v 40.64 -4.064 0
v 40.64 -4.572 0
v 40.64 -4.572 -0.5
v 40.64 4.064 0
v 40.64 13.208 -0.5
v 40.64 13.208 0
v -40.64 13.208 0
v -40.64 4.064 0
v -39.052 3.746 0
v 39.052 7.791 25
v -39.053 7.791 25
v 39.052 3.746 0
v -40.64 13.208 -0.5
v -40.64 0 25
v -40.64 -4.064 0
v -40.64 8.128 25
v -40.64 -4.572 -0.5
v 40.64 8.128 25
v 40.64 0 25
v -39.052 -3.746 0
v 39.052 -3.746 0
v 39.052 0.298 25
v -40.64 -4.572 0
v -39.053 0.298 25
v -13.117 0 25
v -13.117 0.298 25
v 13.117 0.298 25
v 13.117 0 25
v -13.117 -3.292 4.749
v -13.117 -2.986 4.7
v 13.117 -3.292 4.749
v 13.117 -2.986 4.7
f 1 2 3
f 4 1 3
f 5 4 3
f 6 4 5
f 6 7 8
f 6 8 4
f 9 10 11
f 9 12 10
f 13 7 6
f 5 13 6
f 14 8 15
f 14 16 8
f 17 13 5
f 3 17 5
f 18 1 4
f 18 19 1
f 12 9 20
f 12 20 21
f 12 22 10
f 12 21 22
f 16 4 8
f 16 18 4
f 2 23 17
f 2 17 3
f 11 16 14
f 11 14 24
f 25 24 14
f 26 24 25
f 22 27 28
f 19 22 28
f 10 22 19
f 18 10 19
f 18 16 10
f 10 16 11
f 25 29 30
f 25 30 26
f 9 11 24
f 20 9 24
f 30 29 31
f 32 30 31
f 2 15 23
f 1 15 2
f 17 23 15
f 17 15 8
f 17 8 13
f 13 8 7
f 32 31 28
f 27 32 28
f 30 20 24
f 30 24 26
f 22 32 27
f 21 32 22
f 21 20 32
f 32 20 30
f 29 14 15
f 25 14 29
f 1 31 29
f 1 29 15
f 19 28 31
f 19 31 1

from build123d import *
from build123d import SkipClean  # not in build123d's __all__

# Parameters (mm, degrees)
F1_W      = 81.28
F1_H      = 8.128
F2_W      = 81.28
F2_H      = 8.128
F4_W      = 26.233073324
F4_H      = 20.56436991
F5_DEPTH  = 1
F6_W      = 78.105
F6_H      = 7.493
F7_W      = 78.105
F7_H      = 7.493
F9_W      = 81.28
F9_H      = 17.78
F10_DEPTH = 0.5


with BuildPart() as f3:
    # F1 (on Top) → F3 section 0
    with BuildSketch(Plane.XY):
        Rectangle(F1_W, F1_H)
    # F2 (on offset) → F3 section 1
    with BuildSketch(Plane.XY.offset(25)):
        with Locations((0, 4.064)):
            Rectangle(F2_W, F2_H)
    loft()

    # F4 (on face) → F5 (cut)
    with BuildSketch(Plane(origin=(0, -3.9593706469, 0.6436352924), x_dir=(1, 0, 0), z_dir=(0, -0.9870433569, 0.1604537681))):
        with Locations((0, 14.4417314122)):
            Rectangle(F4_W, F4_H)
    extrude(amount=-F5_DEPTH, mode=Mode.SUBTRACT)

    # F6 (on offset) → F8 section 0
    with BuildSketch(Plane.XY.offset(25)):
        with Locations((-1.3208e-06, 4.0446073394)):
            Rectangle(F6_W, F6_H)
    # F7 (on Top) → F8 section 1
    with BuildSketch(Plane.XY):
        Rectangle(F7_W, F7_H)
    loft(mode=Mode.SUBTRACT)

    # F9 (on Top) → F10 (join)
    with BuildSketch(Plane.XY):
        with Locations((-2.539e-07, 4.3180031988)):
            Rectangle(F9_W, F9_H)
    with SkipClean():  # cleaning this boolean's faces spoils the solid; the shape is the same uncleaned
        extrude(amount=-F10_DEPTH)


solid = f3.part
